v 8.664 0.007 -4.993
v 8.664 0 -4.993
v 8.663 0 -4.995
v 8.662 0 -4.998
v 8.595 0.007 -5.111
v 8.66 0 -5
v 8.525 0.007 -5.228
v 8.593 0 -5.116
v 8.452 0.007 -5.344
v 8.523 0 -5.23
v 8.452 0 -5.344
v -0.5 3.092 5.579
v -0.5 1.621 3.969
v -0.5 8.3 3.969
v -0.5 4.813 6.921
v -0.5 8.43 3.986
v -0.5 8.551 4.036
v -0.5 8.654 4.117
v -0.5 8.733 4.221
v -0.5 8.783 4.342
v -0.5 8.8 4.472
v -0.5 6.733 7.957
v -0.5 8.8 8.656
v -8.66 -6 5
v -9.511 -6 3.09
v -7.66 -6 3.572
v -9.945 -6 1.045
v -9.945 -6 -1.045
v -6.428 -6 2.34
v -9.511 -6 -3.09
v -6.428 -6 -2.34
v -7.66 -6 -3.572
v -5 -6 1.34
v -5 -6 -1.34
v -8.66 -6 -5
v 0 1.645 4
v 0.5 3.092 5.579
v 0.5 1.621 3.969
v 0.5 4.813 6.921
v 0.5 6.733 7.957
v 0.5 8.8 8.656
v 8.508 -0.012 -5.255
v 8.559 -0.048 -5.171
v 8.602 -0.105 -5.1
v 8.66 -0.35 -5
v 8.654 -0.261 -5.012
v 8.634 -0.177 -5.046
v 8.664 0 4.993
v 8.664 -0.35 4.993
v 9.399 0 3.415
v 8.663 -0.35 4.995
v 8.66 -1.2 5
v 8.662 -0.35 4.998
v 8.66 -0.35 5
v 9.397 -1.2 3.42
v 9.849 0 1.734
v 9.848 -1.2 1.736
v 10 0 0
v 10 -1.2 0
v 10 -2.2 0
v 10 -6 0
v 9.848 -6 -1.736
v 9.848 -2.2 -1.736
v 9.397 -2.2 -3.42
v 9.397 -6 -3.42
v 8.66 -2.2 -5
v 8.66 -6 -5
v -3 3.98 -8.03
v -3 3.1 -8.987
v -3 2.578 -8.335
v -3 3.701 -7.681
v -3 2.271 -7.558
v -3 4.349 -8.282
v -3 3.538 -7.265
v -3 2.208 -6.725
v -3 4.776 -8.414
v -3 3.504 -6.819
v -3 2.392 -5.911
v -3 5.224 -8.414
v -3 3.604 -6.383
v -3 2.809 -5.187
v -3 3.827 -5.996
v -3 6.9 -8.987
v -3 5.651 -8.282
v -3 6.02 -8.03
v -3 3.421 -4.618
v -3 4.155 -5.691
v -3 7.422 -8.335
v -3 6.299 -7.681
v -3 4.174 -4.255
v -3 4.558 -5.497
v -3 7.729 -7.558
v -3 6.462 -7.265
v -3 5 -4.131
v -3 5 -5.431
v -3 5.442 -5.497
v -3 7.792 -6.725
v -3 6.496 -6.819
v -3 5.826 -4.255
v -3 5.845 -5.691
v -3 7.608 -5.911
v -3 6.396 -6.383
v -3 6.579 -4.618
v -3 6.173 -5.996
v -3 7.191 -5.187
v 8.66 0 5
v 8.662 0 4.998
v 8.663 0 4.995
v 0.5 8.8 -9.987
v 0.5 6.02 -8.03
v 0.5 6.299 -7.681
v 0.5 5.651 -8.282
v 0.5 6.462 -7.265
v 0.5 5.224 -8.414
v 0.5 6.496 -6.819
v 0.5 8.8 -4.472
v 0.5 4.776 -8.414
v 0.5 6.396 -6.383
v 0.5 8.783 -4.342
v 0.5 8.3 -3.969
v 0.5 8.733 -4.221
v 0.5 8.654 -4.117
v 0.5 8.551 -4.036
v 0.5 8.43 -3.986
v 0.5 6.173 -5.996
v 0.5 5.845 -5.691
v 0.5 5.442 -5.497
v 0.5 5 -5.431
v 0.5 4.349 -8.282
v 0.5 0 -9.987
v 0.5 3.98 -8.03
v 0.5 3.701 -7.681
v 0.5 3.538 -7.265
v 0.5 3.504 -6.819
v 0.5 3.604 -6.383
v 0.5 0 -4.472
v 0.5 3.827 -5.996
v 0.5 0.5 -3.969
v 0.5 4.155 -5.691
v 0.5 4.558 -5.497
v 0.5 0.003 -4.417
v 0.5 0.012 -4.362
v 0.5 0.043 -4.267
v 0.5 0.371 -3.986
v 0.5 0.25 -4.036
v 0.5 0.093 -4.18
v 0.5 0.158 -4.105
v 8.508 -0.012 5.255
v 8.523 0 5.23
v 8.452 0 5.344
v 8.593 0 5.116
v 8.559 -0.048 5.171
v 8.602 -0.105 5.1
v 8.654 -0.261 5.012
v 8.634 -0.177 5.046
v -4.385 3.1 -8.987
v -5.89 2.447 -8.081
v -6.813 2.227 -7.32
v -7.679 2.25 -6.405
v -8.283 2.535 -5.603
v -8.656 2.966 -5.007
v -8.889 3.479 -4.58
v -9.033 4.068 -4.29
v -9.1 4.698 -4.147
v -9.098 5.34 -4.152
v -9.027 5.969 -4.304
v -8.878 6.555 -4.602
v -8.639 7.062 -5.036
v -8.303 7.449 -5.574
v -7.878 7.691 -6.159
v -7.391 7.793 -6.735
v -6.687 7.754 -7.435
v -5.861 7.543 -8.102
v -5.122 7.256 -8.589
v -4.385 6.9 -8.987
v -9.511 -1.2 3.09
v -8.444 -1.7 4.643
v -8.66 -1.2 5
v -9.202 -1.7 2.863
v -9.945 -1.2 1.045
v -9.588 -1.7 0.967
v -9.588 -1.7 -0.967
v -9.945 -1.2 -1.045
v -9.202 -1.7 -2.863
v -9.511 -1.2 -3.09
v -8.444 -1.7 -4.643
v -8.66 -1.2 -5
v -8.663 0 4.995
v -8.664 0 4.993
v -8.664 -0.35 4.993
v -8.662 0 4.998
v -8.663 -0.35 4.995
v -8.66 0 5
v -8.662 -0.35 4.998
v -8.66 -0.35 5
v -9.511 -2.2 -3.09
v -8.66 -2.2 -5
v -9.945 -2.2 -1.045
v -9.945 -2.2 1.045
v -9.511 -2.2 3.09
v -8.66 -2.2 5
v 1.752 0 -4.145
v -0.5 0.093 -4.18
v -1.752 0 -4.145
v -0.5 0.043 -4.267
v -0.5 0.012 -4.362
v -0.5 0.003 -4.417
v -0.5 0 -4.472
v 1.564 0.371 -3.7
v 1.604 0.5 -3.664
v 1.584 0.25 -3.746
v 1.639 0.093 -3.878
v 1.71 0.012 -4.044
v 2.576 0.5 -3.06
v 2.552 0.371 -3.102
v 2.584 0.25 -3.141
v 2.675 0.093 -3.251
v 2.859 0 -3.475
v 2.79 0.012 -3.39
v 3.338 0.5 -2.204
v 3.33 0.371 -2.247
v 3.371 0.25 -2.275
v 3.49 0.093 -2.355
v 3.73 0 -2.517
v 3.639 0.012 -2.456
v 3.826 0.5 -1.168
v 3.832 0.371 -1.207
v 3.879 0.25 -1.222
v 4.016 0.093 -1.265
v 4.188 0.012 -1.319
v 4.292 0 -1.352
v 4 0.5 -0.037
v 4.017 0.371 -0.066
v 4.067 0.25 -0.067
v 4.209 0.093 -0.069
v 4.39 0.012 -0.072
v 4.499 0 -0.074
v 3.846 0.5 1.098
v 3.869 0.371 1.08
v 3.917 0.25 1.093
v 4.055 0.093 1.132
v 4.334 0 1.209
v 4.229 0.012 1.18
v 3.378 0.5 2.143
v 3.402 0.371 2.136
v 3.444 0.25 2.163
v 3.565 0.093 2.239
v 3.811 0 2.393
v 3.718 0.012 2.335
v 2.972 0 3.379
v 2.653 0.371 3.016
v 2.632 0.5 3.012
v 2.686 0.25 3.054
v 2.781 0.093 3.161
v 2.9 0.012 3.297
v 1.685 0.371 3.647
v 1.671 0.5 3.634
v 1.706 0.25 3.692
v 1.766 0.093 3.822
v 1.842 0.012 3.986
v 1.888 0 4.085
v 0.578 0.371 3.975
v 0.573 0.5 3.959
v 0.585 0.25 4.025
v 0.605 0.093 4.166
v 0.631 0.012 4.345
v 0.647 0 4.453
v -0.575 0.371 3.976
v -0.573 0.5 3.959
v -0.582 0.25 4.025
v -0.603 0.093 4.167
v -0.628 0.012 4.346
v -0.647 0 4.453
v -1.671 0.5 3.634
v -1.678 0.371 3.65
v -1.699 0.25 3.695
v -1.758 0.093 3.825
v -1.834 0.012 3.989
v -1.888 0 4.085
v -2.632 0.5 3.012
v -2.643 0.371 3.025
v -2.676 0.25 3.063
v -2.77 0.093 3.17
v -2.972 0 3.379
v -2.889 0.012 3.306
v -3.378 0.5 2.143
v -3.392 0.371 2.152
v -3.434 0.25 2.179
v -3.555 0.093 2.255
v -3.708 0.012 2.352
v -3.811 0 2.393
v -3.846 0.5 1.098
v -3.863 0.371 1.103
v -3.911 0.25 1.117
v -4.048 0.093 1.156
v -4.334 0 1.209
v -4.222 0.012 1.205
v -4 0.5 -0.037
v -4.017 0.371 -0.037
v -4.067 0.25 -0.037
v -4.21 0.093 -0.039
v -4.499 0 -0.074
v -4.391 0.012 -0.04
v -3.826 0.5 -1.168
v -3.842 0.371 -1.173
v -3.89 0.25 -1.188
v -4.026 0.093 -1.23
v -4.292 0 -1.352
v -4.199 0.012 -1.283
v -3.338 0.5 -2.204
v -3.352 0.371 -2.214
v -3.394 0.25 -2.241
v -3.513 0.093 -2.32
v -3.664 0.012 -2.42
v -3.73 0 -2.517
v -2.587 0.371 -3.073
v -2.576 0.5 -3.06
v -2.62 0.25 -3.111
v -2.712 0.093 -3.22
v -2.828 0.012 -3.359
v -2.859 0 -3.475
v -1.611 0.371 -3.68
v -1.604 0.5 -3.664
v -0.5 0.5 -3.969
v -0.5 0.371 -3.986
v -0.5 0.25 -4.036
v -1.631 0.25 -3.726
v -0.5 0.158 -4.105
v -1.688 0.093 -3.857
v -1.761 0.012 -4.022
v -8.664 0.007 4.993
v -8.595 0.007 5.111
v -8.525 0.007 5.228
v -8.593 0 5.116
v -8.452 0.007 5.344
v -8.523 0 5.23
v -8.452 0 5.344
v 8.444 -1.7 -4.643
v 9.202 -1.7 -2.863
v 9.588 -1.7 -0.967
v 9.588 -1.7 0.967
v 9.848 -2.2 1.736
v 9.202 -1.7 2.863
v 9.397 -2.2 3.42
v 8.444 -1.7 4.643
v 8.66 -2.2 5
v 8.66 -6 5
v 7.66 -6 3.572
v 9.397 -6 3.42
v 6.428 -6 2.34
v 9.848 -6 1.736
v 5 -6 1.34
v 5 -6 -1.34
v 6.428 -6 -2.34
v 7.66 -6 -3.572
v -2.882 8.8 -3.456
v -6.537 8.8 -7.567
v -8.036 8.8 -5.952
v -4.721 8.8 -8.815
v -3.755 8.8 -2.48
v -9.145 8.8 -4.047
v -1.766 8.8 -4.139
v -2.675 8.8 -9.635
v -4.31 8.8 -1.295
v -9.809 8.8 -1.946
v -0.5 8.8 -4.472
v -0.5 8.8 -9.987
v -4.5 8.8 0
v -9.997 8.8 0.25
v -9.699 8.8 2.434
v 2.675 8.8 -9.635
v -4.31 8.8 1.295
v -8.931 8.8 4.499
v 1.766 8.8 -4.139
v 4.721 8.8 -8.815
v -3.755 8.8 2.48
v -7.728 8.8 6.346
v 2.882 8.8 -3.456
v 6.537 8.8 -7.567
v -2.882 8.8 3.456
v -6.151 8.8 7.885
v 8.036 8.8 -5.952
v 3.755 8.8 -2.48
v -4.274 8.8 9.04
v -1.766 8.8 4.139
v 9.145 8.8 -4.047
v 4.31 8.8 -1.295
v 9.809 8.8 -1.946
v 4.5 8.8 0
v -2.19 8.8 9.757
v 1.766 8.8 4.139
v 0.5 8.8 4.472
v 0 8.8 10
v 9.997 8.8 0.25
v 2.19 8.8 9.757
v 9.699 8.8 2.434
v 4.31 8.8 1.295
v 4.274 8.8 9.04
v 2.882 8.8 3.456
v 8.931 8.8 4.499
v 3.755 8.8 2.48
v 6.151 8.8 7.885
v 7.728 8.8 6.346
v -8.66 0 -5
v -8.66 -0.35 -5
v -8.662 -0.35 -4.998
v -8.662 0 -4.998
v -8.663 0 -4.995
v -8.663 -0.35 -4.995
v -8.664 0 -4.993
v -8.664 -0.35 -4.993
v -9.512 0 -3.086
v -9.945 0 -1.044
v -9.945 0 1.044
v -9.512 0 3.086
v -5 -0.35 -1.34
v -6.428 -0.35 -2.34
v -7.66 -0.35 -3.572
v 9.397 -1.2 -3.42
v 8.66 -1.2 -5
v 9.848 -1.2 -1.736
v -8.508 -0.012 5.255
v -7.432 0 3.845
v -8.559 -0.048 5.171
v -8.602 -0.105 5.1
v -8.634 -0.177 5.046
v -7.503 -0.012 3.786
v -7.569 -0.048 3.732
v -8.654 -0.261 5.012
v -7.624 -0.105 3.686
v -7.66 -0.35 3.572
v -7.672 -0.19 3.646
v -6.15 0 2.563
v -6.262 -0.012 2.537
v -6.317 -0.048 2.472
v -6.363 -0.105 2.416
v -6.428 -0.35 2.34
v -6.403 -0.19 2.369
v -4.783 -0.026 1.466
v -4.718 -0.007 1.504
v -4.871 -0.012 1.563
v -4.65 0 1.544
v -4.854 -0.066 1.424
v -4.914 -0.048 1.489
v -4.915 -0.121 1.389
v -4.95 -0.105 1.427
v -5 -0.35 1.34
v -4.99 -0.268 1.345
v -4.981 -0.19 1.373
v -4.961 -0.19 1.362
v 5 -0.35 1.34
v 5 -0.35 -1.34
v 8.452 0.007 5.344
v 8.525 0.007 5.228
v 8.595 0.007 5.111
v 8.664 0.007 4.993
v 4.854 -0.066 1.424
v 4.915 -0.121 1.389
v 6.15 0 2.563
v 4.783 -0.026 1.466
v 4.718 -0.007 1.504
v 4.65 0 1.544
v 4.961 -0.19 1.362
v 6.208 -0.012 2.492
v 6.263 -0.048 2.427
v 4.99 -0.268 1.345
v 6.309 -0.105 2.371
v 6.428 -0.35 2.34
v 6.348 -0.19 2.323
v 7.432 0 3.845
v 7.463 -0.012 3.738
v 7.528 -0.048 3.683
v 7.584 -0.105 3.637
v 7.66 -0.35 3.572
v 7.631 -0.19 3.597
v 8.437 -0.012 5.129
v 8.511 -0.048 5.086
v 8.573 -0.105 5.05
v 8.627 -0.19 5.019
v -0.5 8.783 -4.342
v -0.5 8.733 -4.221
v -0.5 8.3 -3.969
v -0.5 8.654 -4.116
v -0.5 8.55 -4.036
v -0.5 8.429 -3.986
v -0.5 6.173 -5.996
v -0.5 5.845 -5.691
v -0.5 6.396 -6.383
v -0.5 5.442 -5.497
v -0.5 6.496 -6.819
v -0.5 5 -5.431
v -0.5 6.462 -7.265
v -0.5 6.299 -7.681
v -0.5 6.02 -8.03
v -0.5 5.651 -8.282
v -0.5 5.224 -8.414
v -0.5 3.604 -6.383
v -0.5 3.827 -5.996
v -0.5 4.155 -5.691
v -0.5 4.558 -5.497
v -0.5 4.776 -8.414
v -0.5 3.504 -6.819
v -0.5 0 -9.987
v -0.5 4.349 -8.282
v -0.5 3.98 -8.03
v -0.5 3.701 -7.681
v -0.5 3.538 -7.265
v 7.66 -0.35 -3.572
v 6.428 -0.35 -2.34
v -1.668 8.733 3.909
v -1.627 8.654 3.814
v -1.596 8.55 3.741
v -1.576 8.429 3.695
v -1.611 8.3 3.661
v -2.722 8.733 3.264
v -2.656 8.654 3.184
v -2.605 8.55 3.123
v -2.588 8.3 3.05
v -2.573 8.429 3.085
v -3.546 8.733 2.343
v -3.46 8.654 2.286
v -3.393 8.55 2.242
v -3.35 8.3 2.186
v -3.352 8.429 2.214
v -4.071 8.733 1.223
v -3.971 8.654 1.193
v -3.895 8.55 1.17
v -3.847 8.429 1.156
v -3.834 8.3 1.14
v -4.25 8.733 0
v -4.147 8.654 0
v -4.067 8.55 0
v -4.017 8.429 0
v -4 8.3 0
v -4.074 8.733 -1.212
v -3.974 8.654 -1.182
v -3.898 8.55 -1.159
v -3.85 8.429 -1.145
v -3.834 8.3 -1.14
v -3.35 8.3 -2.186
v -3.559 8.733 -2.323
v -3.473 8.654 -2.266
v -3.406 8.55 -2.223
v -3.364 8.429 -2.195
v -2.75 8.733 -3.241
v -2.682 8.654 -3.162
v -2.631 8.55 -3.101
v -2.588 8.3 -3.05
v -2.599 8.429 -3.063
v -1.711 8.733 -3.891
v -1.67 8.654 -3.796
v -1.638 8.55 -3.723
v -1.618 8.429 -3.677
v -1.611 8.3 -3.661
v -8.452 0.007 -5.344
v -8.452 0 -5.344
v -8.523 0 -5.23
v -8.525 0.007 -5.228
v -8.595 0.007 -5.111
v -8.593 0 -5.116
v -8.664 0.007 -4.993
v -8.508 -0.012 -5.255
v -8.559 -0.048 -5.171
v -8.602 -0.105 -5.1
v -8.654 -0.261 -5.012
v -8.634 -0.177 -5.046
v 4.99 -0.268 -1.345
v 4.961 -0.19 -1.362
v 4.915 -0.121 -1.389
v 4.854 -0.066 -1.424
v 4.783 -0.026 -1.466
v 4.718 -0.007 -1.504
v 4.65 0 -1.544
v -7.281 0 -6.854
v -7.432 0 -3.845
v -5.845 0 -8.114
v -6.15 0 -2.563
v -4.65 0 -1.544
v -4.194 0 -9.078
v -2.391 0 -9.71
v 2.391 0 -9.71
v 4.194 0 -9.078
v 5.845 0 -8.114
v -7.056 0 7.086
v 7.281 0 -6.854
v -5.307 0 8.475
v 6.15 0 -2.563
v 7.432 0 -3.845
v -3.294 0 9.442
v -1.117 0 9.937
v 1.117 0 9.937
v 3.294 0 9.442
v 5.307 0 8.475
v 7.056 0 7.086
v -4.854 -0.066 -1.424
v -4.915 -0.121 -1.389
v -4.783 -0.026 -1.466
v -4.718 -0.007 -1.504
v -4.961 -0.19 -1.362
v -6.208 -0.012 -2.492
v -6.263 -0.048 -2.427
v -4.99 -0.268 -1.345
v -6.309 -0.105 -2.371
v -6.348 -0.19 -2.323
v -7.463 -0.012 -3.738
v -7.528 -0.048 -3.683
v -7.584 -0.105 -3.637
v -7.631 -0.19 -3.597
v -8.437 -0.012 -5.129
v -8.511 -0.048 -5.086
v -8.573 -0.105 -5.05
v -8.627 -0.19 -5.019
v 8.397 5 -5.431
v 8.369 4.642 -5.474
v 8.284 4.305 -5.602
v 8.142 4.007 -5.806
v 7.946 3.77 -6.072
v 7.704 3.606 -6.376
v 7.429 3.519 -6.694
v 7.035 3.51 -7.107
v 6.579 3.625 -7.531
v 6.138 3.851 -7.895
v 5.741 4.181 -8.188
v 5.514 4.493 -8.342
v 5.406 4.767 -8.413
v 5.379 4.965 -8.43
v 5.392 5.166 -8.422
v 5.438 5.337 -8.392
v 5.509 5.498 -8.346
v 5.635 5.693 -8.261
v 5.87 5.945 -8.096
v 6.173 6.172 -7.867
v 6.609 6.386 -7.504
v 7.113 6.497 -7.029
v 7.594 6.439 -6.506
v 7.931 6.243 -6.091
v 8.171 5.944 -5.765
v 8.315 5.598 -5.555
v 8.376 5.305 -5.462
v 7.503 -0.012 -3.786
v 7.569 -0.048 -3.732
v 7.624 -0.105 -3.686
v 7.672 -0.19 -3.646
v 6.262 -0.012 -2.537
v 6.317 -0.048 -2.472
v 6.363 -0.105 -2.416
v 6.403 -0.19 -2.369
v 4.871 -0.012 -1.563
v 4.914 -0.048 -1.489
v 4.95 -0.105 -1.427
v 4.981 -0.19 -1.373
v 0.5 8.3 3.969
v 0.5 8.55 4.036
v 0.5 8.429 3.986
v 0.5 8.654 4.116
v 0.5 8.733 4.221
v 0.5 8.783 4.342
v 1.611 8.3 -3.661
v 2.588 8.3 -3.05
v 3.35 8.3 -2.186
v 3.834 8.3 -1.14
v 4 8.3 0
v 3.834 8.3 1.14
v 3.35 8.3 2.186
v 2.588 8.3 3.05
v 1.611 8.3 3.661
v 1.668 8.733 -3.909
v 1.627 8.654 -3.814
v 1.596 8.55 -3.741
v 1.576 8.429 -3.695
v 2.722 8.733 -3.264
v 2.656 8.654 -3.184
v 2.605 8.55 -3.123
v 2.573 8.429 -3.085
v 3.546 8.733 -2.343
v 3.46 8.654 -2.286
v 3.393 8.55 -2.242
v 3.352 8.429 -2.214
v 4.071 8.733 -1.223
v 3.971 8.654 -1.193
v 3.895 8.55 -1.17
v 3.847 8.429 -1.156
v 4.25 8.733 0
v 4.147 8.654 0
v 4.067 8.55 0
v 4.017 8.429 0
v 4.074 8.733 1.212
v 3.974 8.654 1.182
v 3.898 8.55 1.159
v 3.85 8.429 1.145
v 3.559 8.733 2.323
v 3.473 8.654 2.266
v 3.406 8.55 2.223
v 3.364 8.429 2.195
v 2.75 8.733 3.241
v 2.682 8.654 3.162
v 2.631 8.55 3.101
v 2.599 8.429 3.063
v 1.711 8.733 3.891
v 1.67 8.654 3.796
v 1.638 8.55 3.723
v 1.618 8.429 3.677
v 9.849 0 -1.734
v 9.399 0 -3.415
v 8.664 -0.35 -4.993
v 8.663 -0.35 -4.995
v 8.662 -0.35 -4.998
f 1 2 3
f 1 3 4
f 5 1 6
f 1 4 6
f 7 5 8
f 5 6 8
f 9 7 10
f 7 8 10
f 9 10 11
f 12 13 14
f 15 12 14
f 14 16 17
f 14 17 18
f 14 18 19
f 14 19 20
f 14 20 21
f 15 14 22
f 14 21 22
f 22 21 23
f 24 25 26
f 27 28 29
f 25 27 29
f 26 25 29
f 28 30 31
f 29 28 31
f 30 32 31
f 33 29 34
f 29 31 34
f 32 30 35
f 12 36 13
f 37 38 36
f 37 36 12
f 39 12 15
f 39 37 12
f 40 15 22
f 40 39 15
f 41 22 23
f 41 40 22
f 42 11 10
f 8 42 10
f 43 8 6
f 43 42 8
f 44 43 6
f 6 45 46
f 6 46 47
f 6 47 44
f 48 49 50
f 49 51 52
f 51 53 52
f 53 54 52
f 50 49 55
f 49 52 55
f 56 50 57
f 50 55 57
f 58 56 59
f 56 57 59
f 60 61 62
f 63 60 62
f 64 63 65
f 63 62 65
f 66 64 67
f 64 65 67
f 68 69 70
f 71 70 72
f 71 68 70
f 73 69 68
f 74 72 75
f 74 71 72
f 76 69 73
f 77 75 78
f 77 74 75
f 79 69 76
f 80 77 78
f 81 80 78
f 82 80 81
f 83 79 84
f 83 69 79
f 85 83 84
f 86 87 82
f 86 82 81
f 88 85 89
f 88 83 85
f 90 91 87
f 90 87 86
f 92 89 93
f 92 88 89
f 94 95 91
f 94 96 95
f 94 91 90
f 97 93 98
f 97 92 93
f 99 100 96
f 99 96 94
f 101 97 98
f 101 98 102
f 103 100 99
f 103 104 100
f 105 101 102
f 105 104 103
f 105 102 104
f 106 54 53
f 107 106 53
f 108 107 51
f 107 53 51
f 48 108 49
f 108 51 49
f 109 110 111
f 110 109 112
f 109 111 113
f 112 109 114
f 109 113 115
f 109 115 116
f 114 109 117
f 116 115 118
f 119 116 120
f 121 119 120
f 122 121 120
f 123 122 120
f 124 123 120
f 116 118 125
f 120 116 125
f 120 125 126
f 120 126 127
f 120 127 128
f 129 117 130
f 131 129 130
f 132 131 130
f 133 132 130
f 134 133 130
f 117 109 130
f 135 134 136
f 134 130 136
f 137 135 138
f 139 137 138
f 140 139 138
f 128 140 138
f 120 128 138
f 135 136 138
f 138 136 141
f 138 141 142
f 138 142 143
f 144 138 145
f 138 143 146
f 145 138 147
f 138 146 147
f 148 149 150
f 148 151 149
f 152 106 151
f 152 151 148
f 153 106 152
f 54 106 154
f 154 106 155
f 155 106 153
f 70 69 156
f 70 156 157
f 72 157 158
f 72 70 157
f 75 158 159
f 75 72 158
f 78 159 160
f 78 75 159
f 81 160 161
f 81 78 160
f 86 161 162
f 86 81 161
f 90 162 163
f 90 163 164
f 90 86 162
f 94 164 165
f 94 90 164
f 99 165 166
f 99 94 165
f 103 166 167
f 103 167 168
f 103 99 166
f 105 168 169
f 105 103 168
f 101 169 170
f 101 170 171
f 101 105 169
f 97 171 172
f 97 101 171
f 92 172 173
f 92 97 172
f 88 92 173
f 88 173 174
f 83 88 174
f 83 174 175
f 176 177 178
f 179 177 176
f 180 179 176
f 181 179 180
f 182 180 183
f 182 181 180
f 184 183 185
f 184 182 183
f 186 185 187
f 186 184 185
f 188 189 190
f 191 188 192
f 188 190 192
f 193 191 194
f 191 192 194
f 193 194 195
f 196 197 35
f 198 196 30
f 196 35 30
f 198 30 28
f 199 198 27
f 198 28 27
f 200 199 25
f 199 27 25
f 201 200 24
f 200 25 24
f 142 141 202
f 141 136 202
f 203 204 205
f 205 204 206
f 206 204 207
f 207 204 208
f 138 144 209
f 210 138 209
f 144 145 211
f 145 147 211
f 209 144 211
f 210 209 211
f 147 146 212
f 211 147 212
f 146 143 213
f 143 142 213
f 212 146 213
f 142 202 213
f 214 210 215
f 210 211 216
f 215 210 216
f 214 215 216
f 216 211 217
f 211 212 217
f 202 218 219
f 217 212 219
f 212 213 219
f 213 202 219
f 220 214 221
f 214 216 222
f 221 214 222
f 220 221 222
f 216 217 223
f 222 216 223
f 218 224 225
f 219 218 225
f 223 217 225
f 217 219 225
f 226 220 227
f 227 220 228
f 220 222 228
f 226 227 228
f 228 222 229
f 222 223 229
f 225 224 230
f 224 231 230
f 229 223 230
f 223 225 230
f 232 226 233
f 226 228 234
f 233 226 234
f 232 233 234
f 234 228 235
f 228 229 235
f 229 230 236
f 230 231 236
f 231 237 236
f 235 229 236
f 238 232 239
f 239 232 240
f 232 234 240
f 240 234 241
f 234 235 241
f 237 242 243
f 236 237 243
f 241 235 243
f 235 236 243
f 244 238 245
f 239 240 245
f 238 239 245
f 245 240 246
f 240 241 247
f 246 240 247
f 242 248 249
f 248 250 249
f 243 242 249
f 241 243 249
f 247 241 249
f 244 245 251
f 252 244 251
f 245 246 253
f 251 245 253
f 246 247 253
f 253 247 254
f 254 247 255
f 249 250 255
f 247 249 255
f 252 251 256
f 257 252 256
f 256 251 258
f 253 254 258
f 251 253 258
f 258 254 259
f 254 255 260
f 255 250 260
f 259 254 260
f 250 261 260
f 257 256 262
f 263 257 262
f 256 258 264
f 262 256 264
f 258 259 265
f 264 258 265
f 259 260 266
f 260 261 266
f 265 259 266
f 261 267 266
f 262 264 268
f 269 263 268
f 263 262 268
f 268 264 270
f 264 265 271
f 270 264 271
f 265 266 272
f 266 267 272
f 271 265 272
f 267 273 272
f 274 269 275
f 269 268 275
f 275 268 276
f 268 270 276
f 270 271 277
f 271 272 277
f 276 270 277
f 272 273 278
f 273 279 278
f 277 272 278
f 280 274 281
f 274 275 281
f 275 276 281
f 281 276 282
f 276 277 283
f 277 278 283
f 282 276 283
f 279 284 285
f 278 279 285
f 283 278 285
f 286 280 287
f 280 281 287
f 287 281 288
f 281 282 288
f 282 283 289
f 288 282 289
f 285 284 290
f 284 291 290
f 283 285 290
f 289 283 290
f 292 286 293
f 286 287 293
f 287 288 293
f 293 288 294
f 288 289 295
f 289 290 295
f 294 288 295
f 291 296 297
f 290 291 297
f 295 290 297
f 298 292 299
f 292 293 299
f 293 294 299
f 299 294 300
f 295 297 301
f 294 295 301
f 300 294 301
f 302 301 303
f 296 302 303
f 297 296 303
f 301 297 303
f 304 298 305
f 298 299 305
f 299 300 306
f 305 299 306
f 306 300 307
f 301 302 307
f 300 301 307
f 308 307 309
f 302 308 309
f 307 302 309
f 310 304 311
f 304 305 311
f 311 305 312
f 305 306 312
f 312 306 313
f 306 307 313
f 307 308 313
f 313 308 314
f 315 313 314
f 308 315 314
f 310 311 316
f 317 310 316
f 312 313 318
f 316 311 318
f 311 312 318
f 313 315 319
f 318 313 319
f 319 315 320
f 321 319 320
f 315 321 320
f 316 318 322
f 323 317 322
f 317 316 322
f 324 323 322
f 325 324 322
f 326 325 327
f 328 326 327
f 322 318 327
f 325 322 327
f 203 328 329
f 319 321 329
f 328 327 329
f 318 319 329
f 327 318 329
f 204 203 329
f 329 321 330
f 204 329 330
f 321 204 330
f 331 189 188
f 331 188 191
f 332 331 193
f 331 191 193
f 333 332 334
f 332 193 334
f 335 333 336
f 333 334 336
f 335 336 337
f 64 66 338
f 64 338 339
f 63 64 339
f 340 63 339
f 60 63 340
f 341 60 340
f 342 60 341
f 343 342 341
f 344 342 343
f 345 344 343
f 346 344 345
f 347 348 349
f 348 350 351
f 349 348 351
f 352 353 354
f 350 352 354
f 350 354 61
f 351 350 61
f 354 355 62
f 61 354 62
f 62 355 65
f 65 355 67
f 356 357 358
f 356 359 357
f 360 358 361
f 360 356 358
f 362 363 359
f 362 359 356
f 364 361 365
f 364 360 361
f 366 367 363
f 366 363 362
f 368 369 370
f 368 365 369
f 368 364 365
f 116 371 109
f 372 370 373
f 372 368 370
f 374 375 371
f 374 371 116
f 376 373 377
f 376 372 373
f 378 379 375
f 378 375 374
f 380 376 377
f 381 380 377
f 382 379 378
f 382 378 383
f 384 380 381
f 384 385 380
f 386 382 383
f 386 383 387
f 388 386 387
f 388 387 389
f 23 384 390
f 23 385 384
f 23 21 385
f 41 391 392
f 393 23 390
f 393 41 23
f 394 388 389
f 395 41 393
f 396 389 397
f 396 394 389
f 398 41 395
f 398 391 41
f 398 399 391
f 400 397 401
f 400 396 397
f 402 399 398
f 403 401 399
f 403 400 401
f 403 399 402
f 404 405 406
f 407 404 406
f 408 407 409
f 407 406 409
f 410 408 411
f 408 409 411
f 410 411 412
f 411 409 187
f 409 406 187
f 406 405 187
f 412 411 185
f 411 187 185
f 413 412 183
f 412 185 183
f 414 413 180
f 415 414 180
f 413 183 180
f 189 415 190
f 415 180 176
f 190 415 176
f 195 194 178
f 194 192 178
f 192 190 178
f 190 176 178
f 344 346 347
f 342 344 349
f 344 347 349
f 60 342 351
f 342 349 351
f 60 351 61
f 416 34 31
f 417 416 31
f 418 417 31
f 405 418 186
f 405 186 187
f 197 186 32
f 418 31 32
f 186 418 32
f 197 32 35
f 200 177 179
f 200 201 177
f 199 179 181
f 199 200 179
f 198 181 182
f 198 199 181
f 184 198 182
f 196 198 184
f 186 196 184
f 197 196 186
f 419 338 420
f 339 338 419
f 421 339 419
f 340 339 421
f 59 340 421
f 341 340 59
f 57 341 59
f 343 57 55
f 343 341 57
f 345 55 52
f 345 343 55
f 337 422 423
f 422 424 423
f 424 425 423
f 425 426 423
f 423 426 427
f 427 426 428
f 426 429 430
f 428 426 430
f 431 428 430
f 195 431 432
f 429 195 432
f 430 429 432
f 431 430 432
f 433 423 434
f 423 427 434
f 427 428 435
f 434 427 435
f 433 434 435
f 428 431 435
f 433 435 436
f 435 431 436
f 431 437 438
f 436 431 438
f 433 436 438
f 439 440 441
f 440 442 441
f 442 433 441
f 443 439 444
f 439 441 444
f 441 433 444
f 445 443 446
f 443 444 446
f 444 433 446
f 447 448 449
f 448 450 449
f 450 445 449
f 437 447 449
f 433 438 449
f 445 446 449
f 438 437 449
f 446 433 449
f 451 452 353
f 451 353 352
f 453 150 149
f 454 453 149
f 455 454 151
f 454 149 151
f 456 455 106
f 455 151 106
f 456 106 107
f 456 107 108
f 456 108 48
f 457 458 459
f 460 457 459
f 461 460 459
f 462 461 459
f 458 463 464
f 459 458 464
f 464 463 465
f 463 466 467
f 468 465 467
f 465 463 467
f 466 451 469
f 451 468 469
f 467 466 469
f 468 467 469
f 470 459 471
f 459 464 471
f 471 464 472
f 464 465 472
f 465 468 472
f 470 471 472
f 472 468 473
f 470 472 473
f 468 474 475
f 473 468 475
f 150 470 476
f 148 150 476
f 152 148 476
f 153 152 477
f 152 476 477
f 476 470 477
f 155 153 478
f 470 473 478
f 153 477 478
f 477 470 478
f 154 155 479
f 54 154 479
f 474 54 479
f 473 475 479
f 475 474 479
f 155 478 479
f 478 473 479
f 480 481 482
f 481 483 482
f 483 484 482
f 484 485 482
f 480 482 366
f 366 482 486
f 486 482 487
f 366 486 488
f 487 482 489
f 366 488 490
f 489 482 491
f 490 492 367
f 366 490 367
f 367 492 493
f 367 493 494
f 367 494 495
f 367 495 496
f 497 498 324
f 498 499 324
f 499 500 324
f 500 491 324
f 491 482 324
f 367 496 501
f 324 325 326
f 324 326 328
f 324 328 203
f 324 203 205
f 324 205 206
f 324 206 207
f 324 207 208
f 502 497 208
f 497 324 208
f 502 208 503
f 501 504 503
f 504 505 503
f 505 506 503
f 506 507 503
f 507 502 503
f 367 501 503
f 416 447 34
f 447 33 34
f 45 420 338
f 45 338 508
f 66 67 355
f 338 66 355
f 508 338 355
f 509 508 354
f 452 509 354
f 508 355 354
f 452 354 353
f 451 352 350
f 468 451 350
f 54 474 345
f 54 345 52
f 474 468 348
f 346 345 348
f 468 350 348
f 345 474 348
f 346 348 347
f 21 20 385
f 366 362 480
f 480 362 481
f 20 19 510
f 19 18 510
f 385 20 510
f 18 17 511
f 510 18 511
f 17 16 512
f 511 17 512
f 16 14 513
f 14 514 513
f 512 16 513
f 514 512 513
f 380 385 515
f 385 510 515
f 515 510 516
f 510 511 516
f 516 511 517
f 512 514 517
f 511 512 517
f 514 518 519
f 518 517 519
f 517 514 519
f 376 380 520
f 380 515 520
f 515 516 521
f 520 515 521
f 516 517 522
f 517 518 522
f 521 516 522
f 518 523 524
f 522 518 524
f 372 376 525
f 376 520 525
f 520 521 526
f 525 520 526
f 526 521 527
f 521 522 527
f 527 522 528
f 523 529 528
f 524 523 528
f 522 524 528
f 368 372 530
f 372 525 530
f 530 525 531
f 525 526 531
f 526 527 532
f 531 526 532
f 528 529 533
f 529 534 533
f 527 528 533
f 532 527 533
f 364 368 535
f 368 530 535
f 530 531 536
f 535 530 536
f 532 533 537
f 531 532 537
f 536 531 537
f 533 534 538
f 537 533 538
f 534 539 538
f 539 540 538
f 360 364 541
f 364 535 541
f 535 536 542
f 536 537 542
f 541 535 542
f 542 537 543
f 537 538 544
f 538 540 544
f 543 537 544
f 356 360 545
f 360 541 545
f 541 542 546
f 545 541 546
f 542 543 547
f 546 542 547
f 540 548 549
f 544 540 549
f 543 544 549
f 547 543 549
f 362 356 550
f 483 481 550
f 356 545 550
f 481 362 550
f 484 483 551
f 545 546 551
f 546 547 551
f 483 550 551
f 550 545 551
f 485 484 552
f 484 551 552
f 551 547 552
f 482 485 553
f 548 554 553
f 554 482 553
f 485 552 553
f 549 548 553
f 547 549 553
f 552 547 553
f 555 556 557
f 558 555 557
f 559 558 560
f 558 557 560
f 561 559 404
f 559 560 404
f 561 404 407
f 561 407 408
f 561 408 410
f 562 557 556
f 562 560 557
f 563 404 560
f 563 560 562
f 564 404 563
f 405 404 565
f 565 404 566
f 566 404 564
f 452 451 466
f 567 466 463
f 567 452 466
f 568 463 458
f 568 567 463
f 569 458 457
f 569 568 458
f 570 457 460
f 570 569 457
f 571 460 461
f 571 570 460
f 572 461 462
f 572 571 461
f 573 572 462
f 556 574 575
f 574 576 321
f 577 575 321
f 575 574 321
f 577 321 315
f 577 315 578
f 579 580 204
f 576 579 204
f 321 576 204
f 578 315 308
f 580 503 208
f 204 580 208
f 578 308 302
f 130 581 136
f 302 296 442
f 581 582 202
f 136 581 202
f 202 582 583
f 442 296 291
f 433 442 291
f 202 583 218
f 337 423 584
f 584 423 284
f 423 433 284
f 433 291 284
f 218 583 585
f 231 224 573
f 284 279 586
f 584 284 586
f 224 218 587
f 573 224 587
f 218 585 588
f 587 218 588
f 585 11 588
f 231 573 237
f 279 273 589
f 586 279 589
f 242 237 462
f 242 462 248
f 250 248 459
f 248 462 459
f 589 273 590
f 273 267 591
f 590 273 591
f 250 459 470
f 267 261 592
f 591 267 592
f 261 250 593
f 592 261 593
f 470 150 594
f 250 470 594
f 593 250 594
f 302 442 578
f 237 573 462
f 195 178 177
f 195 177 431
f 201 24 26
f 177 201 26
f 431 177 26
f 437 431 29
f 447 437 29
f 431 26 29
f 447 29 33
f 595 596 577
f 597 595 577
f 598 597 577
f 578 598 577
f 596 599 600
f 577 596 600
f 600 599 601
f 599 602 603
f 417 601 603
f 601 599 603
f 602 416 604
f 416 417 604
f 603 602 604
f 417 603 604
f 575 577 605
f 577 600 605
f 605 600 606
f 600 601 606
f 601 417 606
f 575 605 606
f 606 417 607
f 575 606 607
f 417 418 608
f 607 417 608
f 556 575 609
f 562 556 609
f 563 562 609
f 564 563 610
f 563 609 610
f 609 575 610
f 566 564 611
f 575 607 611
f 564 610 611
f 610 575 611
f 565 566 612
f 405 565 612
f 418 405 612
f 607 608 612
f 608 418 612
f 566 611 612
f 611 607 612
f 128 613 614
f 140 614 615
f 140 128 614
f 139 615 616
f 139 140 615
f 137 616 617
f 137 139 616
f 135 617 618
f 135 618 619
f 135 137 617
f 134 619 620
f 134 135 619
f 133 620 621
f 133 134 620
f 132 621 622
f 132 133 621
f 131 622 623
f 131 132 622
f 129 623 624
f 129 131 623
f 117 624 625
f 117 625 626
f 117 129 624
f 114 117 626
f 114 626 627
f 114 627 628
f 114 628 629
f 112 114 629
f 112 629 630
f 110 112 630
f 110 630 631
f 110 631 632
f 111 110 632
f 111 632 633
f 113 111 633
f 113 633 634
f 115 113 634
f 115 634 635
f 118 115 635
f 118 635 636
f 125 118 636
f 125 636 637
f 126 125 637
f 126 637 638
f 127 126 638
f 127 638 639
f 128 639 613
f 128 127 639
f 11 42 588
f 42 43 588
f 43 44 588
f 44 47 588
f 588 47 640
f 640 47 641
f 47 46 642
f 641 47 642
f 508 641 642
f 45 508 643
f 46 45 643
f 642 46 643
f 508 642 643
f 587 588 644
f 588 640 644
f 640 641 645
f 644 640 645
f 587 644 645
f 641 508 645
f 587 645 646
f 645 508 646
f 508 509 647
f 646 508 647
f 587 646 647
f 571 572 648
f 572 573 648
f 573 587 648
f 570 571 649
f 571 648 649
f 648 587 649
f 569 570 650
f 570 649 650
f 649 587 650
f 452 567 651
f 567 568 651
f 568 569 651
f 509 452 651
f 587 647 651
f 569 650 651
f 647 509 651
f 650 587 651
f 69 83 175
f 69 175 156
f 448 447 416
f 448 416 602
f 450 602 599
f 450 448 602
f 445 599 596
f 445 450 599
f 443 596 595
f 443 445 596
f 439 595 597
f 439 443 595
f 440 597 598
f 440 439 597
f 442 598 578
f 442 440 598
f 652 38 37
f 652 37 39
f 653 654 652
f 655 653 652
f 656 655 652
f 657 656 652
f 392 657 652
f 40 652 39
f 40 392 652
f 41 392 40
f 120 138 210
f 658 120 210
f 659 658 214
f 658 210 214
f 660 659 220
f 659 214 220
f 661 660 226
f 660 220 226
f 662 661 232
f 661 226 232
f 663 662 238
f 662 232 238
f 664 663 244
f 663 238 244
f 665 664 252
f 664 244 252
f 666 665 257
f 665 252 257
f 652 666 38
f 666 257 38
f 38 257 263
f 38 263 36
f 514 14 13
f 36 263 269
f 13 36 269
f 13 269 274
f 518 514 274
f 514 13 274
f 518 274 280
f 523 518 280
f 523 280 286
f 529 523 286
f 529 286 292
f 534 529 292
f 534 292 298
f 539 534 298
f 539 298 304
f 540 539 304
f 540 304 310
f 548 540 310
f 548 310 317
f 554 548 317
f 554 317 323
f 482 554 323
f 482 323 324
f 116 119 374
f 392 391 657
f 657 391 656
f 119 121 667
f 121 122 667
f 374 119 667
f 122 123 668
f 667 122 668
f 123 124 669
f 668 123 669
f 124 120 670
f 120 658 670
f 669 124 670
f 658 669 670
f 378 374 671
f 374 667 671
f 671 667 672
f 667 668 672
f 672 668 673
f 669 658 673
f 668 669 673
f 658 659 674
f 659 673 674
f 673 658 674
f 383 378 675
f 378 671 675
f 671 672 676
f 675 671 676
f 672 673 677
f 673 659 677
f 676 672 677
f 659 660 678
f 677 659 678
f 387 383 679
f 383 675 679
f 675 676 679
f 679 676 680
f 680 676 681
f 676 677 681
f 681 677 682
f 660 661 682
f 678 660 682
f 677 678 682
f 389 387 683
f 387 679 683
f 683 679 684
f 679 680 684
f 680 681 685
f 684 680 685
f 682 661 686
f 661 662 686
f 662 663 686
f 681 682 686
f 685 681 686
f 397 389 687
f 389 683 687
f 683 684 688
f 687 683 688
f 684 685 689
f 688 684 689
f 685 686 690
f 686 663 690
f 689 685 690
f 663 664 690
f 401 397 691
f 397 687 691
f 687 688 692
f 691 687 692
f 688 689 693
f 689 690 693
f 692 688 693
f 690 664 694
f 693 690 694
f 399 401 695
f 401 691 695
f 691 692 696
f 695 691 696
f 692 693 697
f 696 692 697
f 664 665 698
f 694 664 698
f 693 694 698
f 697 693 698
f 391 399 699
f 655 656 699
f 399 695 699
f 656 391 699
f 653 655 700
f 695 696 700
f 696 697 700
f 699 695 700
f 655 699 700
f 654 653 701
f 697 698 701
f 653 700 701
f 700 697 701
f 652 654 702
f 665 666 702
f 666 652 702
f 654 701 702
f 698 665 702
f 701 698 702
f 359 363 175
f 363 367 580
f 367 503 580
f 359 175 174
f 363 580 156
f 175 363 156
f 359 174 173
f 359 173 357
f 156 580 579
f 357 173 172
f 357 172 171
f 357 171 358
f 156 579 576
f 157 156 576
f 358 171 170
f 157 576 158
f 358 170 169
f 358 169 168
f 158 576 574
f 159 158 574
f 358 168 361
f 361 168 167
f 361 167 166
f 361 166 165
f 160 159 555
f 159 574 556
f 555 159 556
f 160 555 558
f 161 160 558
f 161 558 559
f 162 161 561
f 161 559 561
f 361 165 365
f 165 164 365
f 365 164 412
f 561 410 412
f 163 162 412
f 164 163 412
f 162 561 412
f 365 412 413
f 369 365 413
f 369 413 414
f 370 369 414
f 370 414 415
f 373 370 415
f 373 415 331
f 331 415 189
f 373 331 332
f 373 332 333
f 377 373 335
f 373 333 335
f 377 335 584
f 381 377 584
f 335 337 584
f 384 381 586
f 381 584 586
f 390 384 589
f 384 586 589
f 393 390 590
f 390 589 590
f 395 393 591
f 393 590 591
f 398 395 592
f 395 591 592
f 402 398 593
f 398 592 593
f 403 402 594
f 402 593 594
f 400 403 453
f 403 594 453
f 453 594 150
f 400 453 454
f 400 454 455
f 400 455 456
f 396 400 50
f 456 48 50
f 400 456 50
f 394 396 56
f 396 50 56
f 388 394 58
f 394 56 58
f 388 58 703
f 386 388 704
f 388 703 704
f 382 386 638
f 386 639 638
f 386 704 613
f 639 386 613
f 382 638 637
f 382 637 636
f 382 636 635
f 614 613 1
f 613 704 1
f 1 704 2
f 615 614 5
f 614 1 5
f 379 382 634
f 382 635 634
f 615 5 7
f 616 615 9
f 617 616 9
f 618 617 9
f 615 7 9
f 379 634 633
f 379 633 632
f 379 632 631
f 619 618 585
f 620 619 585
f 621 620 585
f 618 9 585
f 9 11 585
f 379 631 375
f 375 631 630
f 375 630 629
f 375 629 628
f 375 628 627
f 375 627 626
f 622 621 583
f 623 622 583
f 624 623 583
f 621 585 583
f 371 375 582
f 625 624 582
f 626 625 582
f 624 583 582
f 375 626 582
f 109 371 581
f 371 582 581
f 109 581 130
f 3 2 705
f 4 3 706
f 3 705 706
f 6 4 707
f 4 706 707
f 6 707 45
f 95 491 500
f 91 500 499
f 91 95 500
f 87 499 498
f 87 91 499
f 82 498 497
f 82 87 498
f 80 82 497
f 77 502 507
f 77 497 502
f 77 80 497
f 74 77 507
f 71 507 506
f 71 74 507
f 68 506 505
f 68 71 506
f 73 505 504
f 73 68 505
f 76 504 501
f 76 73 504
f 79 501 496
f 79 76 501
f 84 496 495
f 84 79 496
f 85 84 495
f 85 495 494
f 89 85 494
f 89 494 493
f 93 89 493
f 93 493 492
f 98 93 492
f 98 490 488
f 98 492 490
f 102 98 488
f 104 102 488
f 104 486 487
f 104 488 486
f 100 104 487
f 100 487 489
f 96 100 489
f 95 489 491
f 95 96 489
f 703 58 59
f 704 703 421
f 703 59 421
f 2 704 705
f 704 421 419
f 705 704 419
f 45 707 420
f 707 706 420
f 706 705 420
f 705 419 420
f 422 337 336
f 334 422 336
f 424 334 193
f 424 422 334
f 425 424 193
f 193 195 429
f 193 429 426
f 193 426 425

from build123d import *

# Parameters (mm, degrees)
SKETCH_1_R          = 10
EXTRUDE_1_DEPTH     = 8.8
EXTRUDE_START       = -6
EXTRUDE_2_DEPTH     = 6
SKETCH_2_R          = 4
CUT_EXTRUDE_1_DEPTH = 10
CUT_EXTRUDE_2_DEPTH = 10
CUT_EXTRUDE_3_DEPTH = 10
SKETCH_4_3_R        = 1.5
CUT_EXTRUDE_4_DEPTH = 20
CUT_EXTRUDE_5_DEPTH = 0.5
FILLET_1_R          = 0.35
FILLET_2_R          = 0.5
FILLET_3_R          = 0.5


with BuildPart() as part:
    # 草图1 → 凸台-拉伸1 (new body)
    with BuildSketch(Plane(origin=(0, 0, 0), x_dir=(1, 0, 0), z_dir=(0, 1, 0))):
        Circle(SKETCH_1_R)
    extrude(amount=EXTRUDE_1_DEPTH)

    # 草图1<3> → 凸台-拉伸2 (add)
    with BuildSketch(Plane(origin=(0, 0, 0), x_dir=(1, 0, 0), z_dir=(0, 1, 0)).offset(EXTRUDE_START)):
        with BuildLine():
            Line((-5, -1.339745962), (-5, 1.339745962))
            ThreePointArc((-5, 1.339745962), (-7.071067812, 2.928932188), (-8.660254038, 5))
            ThreePointArc((-8.660254038, 5), (-10, 0), (-8.660254038, -5))
            ThreePointArc((-8.660254038, -5), (-7.071067812, -2.928932188), (-5, -1.339745962))
        make_face()
        with BuildLine():
            ThreePointArc((8.660254038, -5), (10, 0), (8.660254038, 5))
            ThreePointArc((8.660254038, 5), (7.071067812, 2.928932188), (5, 1.339745962))
            Line((5, 1.339745962), (5, -1.339745962))
            ThreePointArc((5, -1.339745962), (7.071067812, -2.928932188), (8.660254038, -5))
        make_face()
    extrude(amount=EXTRUDE_2_DEPTH)

    # 草图2 → 切除-拉伸1 (cut)
    with BuildSketch(Plane.XZ):
        Circle(SKETCH_2_R)
    extrude(amount=-CUT_EXTRUDE_1_DEPTH, mode=Mode.SUBTRACT)

    # 草图3 → 切除-拉伸2 (cut)
    with BuildSketch(Plane.XZ):
        with BuildLine():
            Line((-0.5, -3.968626967), (-0.5, -9.987492178))
            ThreePointArc((-0.5, -9.987492178), (0, -10), (0.5, -9.987492178))
            Line((0.5, -9.987492178), (0.5, -3.968626967))
            ThreePointArc((0.5, -3.968626967), (0, -4), (-0.5, -3.968626967))
        make_face()
    extrude(amount=-CUT_EXTRUDE_2_DEPTH, mode=Mode.SUBTRACT)

    # 草图4 → 切除-拉伸3 (cut)
    with BuildSketch(Plane(origin=(-3, 0, 0), x_dir=(0, 0, -1), z_dir=(1, 0, 0))):
        with BuildLine():
            Line((8.987492178, 6.9), (8.987492178, 3.1))
            ThreePointArc((8.987492178, 3.1), (4.130795798, 5), (8.987492178, 6.9))
        make_face()
    extrude(amount=-CUT_EXTRUDE_3_DEPTH, mode=Mode.SUBTRACT)

    # 草图4<3> → 切除-拉伸4 (cut)
    with BuildSketch(Plane(origin=(-3, 0, 0), x_dir=(0, 0, -1), z_dir=(1, 0, 0))):
        with Locations((6.930795798, 5)):
            Circle(SKETCH_4_3_R)
    extrude(amount=CUT_EXTRUDE_4_DEPTH, mode=Mode.SUBTRACT)

    # 草图5 → 切除-拉伸5 (cut, symmetric)
    with BuildSketch(Plane(origin=(0, 0, 0), x_dir=(0, 0, -1), z_dir=(1, 0, 0))):
        with BuildLine():
            Line((-8.656253911, 8.8), (-0.006253911, 8.8))
            Line((-0.006253911, 8.8), (-0.006253911, -0.458881174))
            ThreePointArc((-0.006253911, -0.458881174), (-5.535658287, 3.0453589), (-8.656253911, 8.8))
        make_face()
    extrude(amount=CUT_EXTRUDE_5_DEPTH, both=True, mode=Mode.SUBTRACT)

    # 草图6 → 切除-旋转2 (revolve, cut)
    with BuildSketch(Plane.XY):
        Polygon((-10, -2.2), (-10, -1.2), (-9.636728736, -1.7), align=None)
    revolve(axis=Axis((0, 10, 0), (0, -1, 0)), mode=Mode.SUBTRACT)

    # 圆角1
    fillet_1_edges = [part.edges().sort_by_distance(p)[0] for p in [
        (7.071067812, 0, 2.928932188),
        (5, 0, 0),
        (7.071067812, 0, -2.928932188),
        (-7.071067812, 0, 2.928932188),
        (-5, 0, 0),
        (-7.071067812, 0, -2.928932188),
    ]]
    fillet(fillet_1_edges, radius=FILLET_1_R)

    # 圆角2
    fillet_2_edges = [part.edges().sort_by_distance(p)[0] for p in [
        (4, 8.8, 0),
        (-4, 8.8, 0),
    ]]
    fillet(fillet_2_edges, radius=FILLET_2_R)

    # 圆角3
    fillet_3_edges = [part.edges().sort_by_distance(p)[0] for p in [
        (0, 0, 4),
    ]]
    fillet(fillet_3_edges, radius=FILLET_3_R)


solid = part.part
